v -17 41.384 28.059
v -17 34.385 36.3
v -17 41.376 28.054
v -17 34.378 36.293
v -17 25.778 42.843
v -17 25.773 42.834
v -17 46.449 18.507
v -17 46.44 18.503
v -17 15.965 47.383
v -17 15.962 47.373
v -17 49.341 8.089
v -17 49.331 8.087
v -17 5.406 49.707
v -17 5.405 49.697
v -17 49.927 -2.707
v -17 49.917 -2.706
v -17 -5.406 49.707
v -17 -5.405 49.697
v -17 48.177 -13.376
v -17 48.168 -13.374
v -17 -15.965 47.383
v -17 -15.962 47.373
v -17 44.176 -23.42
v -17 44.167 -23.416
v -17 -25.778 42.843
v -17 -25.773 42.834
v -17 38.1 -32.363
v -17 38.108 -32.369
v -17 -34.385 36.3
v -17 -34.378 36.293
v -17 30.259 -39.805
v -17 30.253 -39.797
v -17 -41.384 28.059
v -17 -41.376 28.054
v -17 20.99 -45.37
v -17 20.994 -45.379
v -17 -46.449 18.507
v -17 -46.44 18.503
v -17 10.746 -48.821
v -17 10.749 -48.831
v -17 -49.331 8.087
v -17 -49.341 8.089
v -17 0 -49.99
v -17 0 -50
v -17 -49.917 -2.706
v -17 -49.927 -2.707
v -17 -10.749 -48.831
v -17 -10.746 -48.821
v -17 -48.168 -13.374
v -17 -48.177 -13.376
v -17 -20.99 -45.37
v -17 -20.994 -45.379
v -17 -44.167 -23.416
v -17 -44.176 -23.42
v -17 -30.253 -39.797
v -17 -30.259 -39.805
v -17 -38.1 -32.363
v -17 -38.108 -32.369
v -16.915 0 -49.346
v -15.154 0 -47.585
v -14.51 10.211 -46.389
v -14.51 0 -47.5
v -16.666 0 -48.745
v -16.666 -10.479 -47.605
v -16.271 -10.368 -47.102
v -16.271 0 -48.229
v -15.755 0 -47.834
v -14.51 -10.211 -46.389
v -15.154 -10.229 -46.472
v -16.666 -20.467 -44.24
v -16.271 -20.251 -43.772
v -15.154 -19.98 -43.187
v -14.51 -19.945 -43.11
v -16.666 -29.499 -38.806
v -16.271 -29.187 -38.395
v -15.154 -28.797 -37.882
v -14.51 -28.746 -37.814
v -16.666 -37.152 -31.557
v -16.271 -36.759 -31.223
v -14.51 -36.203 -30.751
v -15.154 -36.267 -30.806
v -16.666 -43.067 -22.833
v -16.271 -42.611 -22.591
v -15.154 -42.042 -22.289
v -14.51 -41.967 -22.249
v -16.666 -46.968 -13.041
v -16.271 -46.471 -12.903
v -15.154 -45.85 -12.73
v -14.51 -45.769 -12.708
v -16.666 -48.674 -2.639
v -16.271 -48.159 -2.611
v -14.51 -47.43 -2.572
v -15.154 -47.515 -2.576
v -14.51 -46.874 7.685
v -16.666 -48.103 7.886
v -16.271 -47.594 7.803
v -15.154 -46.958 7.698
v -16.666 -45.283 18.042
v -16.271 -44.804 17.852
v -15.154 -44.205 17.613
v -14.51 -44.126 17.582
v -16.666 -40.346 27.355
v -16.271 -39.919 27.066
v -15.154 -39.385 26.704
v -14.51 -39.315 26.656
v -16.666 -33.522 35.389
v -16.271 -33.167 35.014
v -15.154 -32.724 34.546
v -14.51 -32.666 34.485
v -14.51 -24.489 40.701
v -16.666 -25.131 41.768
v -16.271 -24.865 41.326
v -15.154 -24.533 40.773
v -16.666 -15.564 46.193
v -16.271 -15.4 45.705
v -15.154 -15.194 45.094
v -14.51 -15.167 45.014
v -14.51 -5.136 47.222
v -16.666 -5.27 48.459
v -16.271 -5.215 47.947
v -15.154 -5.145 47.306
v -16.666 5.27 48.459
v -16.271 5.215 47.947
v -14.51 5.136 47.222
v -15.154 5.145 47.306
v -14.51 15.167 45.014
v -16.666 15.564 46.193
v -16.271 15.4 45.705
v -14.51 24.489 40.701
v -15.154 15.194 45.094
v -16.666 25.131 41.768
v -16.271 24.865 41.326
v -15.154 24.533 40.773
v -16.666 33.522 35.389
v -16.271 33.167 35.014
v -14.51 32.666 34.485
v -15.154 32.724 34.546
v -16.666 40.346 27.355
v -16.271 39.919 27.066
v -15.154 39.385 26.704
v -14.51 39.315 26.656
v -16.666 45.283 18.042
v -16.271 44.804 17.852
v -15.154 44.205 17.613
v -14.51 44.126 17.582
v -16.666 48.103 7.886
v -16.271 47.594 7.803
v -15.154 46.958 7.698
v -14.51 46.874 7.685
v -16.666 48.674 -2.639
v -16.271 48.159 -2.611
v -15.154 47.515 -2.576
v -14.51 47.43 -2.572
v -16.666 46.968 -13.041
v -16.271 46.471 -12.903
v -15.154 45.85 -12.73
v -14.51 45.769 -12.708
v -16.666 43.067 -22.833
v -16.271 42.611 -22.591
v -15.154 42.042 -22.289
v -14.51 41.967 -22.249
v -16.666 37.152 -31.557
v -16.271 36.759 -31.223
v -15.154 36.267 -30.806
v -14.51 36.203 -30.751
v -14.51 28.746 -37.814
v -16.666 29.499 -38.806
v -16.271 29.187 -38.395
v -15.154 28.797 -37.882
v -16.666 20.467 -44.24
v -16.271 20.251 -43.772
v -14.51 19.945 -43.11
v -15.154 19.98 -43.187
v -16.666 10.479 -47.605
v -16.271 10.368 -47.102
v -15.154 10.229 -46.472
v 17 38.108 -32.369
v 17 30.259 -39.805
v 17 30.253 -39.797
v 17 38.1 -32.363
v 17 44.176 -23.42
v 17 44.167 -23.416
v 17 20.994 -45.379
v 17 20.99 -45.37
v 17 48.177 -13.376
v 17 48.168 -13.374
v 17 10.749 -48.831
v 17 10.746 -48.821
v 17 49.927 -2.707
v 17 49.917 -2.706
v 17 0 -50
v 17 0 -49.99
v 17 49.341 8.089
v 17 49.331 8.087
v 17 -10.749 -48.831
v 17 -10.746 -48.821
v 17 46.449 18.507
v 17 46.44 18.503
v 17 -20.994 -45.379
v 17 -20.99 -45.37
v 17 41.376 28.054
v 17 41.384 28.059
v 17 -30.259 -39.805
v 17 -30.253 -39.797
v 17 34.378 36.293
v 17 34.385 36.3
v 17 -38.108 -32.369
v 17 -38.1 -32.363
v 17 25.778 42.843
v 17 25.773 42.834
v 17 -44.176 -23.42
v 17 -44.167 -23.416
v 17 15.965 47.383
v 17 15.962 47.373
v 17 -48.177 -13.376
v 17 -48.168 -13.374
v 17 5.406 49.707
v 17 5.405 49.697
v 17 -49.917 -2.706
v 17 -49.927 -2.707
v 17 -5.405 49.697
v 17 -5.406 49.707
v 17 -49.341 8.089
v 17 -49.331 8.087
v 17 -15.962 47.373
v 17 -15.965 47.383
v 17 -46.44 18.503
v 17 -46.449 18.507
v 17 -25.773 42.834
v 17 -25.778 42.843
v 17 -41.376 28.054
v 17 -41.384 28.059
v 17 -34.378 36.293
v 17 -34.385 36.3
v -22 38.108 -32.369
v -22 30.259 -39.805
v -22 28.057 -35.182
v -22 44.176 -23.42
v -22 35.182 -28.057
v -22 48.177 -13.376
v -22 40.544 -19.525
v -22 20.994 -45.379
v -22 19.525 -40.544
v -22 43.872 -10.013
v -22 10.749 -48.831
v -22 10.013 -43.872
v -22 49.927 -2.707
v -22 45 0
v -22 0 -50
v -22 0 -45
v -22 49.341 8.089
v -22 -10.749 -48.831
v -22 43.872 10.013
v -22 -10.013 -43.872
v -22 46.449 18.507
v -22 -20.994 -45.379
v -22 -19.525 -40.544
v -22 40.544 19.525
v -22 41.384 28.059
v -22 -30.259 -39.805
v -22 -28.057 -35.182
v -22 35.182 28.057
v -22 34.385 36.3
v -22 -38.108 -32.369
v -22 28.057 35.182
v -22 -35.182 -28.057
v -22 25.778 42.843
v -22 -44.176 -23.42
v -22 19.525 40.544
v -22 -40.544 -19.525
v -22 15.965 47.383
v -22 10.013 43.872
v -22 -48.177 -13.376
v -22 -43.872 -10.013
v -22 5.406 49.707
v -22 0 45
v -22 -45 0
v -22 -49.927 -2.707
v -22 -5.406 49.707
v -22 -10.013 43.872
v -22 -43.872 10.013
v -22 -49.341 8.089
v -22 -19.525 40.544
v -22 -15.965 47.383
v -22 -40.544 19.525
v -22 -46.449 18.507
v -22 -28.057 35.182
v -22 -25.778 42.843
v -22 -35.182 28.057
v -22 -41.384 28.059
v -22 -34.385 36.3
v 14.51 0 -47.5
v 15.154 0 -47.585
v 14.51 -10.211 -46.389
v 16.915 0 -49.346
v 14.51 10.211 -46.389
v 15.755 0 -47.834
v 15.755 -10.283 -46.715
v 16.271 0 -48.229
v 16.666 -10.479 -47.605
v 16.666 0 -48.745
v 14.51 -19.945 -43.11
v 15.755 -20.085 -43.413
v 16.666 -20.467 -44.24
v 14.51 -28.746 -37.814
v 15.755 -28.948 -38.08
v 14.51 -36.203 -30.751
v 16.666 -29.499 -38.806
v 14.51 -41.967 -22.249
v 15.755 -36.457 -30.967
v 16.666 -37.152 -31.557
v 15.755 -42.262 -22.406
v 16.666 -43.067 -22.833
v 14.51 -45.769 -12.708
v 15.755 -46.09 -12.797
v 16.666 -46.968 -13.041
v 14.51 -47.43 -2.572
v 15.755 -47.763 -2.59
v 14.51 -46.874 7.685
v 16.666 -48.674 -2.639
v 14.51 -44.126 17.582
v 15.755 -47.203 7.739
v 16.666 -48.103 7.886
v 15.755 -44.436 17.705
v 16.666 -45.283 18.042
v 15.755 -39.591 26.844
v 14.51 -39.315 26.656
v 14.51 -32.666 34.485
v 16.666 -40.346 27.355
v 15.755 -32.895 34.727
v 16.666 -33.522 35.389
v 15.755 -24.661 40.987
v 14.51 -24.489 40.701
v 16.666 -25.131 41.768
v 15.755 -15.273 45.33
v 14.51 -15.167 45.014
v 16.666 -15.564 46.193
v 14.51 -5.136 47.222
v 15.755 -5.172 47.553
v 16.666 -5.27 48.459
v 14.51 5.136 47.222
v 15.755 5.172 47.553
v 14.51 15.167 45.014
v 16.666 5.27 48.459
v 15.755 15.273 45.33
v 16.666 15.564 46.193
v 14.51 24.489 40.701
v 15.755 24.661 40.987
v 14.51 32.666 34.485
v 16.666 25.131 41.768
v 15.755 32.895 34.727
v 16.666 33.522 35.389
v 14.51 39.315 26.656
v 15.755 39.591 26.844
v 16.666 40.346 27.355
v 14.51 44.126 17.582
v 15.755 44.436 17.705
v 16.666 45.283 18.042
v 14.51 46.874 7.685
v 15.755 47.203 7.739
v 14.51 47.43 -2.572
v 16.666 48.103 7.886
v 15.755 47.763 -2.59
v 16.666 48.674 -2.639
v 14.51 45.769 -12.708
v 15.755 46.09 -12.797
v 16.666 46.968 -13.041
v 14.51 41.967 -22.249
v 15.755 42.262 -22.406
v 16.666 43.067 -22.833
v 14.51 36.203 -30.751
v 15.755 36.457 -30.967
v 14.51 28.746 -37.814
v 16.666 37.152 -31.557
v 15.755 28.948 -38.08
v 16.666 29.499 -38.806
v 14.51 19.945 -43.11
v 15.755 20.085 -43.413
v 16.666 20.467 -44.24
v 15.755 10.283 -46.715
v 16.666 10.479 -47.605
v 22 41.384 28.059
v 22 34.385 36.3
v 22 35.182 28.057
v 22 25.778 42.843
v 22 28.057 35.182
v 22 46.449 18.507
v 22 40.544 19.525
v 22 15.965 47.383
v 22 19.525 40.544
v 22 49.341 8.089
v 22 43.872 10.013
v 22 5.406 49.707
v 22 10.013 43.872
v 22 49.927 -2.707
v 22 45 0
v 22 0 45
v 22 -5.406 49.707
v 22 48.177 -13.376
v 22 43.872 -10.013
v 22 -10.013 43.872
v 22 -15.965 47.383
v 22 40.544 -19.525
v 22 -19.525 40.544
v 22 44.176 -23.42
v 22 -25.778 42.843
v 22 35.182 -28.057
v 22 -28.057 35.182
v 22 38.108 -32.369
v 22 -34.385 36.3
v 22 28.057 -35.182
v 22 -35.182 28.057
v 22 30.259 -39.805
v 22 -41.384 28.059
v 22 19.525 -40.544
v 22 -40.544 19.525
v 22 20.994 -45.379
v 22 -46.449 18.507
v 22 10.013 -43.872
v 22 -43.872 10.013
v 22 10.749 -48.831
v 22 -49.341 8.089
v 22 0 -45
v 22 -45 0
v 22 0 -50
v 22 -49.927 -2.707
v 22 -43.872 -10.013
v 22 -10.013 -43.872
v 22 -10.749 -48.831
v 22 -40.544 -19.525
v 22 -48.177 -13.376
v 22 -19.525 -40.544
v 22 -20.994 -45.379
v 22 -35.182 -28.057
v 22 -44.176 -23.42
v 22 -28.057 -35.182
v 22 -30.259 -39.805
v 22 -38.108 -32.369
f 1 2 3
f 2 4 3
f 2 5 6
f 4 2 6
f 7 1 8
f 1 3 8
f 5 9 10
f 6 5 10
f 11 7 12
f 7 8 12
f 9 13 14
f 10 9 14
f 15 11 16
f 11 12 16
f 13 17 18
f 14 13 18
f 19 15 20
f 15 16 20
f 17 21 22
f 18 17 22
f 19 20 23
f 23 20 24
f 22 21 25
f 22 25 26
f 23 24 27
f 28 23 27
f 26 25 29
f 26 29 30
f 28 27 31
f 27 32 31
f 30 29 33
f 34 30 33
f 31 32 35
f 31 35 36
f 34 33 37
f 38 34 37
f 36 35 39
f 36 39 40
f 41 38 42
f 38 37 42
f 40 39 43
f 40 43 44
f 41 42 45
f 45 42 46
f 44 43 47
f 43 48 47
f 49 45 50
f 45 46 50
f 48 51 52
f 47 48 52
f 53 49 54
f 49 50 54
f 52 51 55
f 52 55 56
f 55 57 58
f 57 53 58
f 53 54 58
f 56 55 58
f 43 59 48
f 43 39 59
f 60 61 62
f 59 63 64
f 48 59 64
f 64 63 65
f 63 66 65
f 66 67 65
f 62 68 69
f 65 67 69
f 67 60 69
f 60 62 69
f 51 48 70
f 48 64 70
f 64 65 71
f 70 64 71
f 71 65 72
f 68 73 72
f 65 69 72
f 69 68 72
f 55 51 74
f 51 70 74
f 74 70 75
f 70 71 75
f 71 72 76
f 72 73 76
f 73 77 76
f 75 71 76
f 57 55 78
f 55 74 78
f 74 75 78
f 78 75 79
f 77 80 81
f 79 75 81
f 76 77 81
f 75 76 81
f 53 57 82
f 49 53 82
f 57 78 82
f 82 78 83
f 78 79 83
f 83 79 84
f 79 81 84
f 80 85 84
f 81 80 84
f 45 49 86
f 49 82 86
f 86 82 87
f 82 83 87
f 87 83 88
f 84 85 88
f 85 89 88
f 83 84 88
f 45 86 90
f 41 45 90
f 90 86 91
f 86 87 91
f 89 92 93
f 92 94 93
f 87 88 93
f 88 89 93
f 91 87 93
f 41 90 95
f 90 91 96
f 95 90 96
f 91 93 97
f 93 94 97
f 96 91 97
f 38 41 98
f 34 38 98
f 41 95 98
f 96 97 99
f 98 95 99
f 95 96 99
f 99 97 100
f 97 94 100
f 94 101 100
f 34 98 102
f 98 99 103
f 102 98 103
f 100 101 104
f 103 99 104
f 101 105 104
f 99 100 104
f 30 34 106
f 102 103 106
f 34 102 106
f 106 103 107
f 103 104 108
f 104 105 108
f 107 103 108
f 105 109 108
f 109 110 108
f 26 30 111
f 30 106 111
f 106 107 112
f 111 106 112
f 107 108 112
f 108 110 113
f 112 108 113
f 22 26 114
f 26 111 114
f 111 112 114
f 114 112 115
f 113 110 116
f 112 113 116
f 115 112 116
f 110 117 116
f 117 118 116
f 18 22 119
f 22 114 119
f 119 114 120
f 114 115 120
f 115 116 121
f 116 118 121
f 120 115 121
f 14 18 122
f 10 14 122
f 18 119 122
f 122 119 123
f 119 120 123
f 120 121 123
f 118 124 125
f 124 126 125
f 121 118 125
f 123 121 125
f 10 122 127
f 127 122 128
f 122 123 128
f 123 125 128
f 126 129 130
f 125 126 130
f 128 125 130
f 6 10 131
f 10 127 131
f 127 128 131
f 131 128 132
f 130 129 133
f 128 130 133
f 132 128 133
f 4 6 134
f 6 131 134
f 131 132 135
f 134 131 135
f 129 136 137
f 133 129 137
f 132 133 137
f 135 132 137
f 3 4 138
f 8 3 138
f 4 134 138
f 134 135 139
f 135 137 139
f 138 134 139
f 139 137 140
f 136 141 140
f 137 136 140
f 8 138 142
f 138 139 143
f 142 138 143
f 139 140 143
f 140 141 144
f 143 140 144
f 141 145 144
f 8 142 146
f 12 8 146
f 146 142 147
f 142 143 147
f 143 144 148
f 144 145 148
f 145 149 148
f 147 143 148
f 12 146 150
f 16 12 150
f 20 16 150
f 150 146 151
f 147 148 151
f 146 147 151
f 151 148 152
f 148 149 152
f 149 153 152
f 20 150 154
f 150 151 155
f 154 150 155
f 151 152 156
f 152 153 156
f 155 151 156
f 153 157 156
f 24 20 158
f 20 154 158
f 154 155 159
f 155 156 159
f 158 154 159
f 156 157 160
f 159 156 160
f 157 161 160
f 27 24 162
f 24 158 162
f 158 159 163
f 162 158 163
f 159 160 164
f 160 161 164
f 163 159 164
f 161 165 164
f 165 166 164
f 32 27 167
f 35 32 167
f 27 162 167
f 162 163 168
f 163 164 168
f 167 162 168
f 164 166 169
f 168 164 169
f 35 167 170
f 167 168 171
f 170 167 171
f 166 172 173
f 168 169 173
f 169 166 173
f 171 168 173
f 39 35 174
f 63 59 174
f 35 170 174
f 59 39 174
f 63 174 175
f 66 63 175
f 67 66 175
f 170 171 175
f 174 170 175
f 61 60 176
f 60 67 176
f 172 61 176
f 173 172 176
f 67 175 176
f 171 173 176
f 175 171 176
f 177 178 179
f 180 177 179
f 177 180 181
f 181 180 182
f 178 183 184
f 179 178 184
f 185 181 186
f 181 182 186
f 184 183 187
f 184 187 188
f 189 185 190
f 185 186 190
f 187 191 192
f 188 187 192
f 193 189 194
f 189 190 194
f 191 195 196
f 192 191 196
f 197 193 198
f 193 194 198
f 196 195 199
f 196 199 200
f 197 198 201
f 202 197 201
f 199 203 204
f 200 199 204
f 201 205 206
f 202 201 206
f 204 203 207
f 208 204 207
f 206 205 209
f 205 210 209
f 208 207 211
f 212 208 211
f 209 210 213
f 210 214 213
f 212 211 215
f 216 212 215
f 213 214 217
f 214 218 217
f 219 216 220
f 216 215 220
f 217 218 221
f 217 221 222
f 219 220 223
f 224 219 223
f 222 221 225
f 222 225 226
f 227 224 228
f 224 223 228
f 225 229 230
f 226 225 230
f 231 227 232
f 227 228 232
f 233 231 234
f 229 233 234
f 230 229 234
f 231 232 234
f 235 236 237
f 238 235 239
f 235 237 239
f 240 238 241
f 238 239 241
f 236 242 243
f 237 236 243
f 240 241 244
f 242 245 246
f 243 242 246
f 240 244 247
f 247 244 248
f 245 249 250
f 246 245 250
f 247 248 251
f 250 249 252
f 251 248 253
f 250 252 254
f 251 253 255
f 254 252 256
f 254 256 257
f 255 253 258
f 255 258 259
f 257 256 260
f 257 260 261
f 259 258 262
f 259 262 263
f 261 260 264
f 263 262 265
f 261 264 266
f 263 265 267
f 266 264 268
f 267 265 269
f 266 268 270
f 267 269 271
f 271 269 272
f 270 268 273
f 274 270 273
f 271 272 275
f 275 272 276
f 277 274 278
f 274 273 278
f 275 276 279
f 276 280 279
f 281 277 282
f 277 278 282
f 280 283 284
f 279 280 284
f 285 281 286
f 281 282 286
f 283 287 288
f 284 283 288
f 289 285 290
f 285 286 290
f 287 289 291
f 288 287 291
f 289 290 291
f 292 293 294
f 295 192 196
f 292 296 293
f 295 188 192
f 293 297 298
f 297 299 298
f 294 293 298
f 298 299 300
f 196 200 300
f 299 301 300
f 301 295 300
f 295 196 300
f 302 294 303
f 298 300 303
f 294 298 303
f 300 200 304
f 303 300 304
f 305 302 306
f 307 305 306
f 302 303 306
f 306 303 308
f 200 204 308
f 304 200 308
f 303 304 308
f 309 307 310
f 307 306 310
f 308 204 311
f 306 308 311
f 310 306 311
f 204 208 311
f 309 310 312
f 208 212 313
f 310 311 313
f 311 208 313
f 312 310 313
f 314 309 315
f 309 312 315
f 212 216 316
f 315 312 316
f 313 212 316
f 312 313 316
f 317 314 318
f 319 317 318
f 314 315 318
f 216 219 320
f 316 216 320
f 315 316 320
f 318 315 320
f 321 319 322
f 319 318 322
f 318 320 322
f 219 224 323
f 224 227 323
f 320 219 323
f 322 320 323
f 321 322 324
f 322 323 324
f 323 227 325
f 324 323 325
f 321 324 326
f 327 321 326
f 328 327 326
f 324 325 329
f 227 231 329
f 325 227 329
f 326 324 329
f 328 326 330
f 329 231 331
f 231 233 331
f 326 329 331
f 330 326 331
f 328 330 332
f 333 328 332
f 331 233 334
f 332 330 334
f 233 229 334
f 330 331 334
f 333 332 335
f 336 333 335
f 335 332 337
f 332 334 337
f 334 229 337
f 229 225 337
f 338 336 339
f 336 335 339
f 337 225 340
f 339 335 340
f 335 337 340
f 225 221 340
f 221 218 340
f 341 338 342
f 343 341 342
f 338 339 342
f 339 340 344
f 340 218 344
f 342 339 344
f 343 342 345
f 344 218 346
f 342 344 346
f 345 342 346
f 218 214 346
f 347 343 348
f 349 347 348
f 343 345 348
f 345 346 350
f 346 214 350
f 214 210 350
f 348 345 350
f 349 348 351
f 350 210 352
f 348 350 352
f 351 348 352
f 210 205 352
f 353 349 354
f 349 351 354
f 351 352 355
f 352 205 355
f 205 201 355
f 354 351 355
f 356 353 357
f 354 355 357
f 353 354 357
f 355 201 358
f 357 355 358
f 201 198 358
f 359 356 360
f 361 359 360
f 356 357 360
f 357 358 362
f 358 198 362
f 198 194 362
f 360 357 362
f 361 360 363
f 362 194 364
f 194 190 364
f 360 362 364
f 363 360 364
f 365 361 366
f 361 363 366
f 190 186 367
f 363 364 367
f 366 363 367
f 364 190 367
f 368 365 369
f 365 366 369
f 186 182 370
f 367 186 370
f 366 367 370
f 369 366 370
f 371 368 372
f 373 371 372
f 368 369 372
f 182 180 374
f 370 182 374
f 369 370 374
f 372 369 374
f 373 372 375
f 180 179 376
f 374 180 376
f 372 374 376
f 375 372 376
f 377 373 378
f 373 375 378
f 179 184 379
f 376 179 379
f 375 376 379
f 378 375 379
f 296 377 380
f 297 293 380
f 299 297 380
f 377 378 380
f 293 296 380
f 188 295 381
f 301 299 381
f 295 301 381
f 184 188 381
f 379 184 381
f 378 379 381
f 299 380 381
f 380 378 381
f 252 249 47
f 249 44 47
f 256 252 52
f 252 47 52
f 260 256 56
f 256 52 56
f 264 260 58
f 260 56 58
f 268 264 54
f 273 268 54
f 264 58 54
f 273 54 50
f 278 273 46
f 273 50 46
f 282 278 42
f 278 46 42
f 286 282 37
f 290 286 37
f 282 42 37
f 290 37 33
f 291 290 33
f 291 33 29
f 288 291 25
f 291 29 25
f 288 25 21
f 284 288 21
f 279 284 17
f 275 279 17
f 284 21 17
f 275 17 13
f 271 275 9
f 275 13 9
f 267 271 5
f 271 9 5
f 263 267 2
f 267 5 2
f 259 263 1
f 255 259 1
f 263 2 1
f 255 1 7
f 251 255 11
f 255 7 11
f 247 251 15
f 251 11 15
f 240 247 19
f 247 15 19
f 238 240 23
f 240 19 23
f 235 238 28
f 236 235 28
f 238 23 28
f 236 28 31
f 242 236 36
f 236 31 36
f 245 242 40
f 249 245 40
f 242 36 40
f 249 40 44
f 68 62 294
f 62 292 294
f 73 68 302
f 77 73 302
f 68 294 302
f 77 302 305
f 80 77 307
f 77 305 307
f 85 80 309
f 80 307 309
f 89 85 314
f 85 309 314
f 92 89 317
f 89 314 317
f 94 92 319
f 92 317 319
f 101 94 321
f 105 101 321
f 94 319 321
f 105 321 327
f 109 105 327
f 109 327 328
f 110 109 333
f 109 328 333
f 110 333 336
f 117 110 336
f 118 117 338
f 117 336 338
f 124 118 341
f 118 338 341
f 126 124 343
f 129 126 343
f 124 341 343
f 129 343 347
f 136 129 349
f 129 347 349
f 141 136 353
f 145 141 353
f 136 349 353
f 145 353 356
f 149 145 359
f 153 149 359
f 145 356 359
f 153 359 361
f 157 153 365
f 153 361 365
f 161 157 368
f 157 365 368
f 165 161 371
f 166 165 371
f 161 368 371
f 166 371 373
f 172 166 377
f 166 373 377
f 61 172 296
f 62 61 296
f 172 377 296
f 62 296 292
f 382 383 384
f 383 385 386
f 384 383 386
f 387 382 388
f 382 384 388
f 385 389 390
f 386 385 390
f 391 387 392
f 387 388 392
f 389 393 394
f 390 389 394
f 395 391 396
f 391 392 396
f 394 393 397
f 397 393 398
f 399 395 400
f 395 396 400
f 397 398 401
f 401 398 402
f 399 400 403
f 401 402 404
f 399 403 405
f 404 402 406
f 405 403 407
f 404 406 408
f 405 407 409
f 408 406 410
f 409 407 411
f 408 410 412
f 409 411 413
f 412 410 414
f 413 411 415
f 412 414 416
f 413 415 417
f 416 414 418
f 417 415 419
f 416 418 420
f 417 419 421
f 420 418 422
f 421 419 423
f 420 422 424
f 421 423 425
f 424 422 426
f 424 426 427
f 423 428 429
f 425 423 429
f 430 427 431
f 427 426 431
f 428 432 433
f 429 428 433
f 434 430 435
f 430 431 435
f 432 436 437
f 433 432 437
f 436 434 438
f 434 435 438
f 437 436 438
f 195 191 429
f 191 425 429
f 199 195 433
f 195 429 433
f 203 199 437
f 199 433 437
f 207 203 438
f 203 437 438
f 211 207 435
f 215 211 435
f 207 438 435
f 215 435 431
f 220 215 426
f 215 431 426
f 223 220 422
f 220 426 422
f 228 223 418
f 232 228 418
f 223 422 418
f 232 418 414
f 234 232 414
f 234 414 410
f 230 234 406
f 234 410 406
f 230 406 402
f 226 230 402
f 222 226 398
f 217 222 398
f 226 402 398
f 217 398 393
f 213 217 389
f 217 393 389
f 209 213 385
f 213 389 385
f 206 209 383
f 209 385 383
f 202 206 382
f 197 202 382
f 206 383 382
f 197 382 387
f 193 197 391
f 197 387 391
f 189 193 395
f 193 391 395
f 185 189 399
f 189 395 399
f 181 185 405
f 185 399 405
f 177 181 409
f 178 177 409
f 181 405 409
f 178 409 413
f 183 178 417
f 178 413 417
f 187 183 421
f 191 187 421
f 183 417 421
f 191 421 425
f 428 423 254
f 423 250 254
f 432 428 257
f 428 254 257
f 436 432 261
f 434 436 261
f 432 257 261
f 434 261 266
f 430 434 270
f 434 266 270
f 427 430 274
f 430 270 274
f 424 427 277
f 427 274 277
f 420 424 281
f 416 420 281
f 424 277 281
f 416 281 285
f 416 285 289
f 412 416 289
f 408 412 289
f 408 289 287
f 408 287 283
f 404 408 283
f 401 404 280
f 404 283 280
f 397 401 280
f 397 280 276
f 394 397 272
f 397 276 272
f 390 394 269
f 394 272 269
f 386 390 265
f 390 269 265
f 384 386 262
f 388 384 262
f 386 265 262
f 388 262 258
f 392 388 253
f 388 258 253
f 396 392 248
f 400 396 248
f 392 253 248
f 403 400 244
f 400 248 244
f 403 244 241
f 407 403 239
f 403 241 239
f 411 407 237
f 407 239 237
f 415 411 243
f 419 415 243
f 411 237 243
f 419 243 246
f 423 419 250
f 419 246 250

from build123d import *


with BuildPart() as part:
    # Sketch1 → Revolve1 (revolve)
    with BuildSketch(Plane.XY, mode=Mode.PRIVATE) as revolve1_sk:
        with BuildLine():
            Line((22, 45), (-22, 45))
            Line((-22, 45), (-22, 50))
            Line((-22, 50), (-17, 50))
            Line((-17, 50), (-17, 49.99))
            ThreePointArc((-17, 49.99), (-16.270695885, 48.229304115), (-14.51, 47.5))
            Line((-14.51, 47.5), (14.51, 47.5))
            ThreePointArc((14.51, 47.5), (16.270695885, 48.229304115), (17, 49.99))
            Line((17, 49.99), (17, 50))
            Line((17, 50), (22, 50))
            Line((22, 50), (22, 45))
        make_face()
    revolve(revolve1_sk.sketch.rotate(Axis((62.978723404, 0, 0), (-1, 0, 0)), 90), axis=Axis((62.978723404, 0, 0), (-1, 0, 0)))


solid = part.part
